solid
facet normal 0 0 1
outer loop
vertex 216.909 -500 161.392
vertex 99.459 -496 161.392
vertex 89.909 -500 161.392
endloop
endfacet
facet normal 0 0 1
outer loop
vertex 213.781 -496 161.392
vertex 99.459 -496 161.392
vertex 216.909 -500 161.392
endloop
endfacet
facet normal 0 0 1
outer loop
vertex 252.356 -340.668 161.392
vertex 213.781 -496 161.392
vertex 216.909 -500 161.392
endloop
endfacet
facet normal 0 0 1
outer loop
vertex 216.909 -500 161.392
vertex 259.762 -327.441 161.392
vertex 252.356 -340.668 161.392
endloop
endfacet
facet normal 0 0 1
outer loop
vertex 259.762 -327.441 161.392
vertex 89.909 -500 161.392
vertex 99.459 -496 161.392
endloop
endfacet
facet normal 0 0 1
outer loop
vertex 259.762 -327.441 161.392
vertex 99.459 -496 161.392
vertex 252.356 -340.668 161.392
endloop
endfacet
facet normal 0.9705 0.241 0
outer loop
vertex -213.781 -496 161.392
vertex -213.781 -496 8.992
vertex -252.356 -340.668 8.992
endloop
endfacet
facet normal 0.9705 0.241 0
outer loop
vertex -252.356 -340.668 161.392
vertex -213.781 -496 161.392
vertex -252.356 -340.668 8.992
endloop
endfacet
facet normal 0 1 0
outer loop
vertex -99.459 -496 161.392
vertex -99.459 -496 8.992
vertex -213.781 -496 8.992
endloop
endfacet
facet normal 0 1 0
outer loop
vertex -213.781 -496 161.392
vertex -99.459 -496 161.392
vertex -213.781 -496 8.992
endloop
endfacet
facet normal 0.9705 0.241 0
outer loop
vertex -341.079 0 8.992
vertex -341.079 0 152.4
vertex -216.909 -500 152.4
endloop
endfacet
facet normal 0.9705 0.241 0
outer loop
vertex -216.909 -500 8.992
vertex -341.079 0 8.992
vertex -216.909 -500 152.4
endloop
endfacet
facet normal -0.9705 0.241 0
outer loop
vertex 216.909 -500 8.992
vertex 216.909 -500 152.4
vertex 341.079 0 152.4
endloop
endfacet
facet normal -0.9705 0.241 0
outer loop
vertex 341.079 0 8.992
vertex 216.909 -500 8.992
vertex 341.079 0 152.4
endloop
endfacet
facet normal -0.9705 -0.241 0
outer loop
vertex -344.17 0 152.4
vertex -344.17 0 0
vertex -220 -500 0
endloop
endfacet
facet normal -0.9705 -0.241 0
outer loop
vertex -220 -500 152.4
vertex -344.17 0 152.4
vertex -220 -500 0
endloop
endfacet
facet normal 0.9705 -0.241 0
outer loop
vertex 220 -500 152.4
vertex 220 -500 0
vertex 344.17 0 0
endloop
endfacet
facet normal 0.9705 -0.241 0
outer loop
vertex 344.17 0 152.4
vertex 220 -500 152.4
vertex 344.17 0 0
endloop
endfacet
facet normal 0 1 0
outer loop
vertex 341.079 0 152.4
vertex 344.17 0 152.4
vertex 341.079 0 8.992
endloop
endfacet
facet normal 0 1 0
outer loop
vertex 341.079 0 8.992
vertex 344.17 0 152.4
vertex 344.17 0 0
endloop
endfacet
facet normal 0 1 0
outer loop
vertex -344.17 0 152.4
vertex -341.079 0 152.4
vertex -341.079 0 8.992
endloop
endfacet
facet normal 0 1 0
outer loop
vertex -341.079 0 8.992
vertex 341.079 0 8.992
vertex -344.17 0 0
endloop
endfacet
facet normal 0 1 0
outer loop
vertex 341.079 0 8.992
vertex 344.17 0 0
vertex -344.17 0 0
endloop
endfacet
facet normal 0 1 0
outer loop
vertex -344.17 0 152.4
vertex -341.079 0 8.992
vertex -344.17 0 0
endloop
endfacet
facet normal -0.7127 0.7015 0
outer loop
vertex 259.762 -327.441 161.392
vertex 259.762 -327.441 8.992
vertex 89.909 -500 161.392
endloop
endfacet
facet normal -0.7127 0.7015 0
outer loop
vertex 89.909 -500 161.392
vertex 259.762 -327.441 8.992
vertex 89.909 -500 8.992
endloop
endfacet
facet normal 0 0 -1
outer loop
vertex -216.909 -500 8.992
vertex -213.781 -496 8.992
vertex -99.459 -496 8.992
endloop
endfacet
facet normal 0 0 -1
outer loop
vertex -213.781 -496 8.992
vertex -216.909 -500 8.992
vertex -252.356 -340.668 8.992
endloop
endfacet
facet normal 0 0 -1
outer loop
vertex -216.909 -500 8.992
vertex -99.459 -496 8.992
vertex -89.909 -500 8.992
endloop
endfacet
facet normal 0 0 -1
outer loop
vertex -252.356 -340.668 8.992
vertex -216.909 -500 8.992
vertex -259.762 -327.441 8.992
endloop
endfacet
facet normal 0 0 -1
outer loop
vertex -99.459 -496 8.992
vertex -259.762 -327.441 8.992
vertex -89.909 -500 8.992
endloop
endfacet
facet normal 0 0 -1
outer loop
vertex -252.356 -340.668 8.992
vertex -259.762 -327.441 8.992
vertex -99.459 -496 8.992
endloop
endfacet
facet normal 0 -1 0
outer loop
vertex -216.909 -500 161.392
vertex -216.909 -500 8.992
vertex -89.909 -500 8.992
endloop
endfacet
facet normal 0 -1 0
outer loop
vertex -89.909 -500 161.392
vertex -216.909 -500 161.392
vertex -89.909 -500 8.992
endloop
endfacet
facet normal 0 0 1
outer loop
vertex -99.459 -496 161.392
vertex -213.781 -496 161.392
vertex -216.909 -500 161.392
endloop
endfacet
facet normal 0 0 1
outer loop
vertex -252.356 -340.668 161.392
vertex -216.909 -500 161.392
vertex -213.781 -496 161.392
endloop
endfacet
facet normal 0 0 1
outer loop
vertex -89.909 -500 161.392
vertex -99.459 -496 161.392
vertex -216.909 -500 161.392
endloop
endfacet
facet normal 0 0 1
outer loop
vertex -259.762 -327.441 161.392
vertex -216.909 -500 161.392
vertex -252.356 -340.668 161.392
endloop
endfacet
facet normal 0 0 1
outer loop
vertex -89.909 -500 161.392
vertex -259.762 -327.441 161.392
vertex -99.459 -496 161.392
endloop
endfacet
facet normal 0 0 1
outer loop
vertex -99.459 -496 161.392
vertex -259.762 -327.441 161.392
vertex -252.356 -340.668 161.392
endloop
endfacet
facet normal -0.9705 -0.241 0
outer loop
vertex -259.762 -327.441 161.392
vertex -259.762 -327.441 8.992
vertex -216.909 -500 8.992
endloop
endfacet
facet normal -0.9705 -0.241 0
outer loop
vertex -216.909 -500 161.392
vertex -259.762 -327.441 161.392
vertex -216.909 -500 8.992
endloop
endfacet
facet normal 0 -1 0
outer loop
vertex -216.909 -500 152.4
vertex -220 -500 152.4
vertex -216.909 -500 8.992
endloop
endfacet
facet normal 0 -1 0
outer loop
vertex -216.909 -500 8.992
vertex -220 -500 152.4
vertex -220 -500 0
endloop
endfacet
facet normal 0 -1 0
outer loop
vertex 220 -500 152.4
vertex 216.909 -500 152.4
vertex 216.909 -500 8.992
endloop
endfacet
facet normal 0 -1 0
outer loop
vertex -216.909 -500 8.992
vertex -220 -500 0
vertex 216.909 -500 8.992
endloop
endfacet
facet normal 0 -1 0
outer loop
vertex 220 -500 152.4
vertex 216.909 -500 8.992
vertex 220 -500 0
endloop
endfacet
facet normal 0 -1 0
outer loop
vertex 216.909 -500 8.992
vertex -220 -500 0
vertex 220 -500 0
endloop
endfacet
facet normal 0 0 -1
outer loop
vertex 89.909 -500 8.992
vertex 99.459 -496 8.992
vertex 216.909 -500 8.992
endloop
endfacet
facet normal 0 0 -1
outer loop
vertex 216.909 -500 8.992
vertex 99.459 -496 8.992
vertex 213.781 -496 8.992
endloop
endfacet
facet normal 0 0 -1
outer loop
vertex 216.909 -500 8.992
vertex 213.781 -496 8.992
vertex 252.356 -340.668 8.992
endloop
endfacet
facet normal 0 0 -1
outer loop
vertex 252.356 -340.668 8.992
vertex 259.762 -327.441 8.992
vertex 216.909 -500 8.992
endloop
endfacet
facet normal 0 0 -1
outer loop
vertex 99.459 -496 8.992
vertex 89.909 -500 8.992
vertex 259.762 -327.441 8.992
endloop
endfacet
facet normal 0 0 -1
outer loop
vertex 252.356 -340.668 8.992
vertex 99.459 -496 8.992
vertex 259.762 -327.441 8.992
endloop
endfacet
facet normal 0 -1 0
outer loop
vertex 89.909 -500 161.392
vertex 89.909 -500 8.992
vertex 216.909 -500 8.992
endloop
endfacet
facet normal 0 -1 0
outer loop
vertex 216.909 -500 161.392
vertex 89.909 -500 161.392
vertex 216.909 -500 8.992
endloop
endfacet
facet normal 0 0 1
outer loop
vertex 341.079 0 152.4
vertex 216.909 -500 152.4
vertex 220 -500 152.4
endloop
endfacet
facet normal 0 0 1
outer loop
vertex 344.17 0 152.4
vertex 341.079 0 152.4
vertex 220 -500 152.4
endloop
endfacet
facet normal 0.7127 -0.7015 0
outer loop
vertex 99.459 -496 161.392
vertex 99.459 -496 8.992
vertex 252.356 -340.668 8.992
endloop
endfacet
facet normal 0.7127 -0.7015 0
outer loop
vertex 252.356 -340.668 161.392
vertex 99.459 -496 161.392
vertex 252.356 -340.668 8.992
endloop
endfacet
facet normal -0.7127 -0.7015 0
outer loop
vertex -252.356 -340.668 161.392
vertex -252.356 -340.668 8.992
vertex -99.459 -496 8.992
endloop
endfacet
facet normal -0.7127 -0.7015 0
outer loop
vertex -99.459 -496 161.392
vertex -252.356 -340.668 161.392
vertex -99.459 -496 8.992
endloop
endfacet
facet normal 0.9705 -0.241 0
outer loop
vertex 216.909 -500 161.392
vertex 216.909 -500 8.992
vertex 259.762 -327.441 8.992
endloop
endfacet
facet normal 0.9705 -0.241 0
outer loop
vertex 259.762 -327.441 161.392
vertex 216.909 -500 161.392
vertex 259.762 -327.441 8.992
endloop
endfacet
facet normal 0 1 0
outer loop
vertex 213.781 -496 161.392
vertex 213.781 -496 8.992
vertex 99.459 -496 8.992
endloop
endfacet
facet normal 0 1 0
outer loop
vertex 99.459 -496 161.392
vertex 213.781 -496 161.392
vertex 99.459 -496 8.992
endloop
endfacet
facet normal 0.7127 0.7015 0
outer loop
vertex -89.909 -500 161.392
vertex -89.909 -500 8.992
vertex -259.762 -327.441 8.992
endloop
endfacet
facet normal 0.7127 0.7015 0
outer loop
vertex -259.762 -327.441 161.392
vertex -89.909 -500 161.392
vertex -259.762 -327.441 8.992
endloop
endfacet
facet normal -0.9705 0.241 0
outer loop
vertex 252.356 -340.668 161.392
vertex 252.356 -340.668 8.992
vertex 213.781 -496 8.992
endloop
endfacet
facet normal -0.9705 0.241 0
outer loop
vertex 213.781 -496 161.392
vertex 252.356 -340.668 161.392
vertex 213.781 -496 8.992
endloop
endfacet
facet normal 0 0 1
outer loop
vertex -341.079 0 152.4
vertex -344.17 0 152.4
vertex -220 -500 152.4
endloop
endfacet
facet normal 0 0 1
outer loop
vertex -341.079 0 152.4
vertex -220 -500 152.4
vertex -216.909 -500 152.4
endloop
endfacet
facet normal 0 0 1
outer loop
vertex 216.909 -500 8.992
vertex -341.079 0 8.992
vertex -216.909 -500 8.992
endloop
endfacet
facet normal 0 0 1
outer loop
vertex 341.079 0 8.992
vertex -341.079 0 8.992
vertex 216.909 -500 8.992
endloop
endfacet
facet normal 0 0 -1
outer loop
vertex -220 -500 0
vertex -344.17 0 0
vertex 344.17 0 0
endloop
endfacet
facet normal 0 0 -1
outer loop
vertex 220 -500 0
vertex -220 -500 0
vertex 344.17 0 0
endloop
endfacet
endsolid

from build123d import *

# Parameters (mm, degrees)
F1_DEPTH = 152.4
F3_DEPTH = 143.4084
F5_DEPTH = 152.4


with BuildPart() as f1:
    # F0 (on Top) → F1 (new body)
    with BuildSketch(Plane.XY):
        Polygon((344.17, 0), (-344.17, 0), (-220, -500), (220, -500), align=None)
    extrude(amount=F1_DEPTH)

    # F2 (on face) → F3 (cut)
    with BuildSketch(Plane.XY.offset(152.4)):
        Polygon((-341.258439, 0.723057), (-216.908875, -500), (216.908875, -500), (341.258439, 0.723057), align=None)
    extrude(amount=-F3_DEPTH, mode=Mode.SUBTRACT)


with BuildPart() as f5:
    # F4 (on face) → F5 (new body)
    with BuildSketch(Plane.XY.offset(8.9916)):
        Polygon((89.908875, -500), (216.908875, -500), (259.762059, -327.441475), align=None)
        Polygon((213.780735, -496), (99.458849, -496), (252.355985, -340.667591), align=None, mode=Mode.SUBTRACT)
        Polygon((-259.762059, -327.441475), (-216.908875, -500), (-89.908875, -500), align=None)
        Polygon((-252.355985, -340.667591), (-99.458849, -496), (-213.780735, -496), align=None, mode=Mode.SUBTRACT)
    extrude(amount=F5_DEPTH)


solid = Compound([f1.part, f5.part])
